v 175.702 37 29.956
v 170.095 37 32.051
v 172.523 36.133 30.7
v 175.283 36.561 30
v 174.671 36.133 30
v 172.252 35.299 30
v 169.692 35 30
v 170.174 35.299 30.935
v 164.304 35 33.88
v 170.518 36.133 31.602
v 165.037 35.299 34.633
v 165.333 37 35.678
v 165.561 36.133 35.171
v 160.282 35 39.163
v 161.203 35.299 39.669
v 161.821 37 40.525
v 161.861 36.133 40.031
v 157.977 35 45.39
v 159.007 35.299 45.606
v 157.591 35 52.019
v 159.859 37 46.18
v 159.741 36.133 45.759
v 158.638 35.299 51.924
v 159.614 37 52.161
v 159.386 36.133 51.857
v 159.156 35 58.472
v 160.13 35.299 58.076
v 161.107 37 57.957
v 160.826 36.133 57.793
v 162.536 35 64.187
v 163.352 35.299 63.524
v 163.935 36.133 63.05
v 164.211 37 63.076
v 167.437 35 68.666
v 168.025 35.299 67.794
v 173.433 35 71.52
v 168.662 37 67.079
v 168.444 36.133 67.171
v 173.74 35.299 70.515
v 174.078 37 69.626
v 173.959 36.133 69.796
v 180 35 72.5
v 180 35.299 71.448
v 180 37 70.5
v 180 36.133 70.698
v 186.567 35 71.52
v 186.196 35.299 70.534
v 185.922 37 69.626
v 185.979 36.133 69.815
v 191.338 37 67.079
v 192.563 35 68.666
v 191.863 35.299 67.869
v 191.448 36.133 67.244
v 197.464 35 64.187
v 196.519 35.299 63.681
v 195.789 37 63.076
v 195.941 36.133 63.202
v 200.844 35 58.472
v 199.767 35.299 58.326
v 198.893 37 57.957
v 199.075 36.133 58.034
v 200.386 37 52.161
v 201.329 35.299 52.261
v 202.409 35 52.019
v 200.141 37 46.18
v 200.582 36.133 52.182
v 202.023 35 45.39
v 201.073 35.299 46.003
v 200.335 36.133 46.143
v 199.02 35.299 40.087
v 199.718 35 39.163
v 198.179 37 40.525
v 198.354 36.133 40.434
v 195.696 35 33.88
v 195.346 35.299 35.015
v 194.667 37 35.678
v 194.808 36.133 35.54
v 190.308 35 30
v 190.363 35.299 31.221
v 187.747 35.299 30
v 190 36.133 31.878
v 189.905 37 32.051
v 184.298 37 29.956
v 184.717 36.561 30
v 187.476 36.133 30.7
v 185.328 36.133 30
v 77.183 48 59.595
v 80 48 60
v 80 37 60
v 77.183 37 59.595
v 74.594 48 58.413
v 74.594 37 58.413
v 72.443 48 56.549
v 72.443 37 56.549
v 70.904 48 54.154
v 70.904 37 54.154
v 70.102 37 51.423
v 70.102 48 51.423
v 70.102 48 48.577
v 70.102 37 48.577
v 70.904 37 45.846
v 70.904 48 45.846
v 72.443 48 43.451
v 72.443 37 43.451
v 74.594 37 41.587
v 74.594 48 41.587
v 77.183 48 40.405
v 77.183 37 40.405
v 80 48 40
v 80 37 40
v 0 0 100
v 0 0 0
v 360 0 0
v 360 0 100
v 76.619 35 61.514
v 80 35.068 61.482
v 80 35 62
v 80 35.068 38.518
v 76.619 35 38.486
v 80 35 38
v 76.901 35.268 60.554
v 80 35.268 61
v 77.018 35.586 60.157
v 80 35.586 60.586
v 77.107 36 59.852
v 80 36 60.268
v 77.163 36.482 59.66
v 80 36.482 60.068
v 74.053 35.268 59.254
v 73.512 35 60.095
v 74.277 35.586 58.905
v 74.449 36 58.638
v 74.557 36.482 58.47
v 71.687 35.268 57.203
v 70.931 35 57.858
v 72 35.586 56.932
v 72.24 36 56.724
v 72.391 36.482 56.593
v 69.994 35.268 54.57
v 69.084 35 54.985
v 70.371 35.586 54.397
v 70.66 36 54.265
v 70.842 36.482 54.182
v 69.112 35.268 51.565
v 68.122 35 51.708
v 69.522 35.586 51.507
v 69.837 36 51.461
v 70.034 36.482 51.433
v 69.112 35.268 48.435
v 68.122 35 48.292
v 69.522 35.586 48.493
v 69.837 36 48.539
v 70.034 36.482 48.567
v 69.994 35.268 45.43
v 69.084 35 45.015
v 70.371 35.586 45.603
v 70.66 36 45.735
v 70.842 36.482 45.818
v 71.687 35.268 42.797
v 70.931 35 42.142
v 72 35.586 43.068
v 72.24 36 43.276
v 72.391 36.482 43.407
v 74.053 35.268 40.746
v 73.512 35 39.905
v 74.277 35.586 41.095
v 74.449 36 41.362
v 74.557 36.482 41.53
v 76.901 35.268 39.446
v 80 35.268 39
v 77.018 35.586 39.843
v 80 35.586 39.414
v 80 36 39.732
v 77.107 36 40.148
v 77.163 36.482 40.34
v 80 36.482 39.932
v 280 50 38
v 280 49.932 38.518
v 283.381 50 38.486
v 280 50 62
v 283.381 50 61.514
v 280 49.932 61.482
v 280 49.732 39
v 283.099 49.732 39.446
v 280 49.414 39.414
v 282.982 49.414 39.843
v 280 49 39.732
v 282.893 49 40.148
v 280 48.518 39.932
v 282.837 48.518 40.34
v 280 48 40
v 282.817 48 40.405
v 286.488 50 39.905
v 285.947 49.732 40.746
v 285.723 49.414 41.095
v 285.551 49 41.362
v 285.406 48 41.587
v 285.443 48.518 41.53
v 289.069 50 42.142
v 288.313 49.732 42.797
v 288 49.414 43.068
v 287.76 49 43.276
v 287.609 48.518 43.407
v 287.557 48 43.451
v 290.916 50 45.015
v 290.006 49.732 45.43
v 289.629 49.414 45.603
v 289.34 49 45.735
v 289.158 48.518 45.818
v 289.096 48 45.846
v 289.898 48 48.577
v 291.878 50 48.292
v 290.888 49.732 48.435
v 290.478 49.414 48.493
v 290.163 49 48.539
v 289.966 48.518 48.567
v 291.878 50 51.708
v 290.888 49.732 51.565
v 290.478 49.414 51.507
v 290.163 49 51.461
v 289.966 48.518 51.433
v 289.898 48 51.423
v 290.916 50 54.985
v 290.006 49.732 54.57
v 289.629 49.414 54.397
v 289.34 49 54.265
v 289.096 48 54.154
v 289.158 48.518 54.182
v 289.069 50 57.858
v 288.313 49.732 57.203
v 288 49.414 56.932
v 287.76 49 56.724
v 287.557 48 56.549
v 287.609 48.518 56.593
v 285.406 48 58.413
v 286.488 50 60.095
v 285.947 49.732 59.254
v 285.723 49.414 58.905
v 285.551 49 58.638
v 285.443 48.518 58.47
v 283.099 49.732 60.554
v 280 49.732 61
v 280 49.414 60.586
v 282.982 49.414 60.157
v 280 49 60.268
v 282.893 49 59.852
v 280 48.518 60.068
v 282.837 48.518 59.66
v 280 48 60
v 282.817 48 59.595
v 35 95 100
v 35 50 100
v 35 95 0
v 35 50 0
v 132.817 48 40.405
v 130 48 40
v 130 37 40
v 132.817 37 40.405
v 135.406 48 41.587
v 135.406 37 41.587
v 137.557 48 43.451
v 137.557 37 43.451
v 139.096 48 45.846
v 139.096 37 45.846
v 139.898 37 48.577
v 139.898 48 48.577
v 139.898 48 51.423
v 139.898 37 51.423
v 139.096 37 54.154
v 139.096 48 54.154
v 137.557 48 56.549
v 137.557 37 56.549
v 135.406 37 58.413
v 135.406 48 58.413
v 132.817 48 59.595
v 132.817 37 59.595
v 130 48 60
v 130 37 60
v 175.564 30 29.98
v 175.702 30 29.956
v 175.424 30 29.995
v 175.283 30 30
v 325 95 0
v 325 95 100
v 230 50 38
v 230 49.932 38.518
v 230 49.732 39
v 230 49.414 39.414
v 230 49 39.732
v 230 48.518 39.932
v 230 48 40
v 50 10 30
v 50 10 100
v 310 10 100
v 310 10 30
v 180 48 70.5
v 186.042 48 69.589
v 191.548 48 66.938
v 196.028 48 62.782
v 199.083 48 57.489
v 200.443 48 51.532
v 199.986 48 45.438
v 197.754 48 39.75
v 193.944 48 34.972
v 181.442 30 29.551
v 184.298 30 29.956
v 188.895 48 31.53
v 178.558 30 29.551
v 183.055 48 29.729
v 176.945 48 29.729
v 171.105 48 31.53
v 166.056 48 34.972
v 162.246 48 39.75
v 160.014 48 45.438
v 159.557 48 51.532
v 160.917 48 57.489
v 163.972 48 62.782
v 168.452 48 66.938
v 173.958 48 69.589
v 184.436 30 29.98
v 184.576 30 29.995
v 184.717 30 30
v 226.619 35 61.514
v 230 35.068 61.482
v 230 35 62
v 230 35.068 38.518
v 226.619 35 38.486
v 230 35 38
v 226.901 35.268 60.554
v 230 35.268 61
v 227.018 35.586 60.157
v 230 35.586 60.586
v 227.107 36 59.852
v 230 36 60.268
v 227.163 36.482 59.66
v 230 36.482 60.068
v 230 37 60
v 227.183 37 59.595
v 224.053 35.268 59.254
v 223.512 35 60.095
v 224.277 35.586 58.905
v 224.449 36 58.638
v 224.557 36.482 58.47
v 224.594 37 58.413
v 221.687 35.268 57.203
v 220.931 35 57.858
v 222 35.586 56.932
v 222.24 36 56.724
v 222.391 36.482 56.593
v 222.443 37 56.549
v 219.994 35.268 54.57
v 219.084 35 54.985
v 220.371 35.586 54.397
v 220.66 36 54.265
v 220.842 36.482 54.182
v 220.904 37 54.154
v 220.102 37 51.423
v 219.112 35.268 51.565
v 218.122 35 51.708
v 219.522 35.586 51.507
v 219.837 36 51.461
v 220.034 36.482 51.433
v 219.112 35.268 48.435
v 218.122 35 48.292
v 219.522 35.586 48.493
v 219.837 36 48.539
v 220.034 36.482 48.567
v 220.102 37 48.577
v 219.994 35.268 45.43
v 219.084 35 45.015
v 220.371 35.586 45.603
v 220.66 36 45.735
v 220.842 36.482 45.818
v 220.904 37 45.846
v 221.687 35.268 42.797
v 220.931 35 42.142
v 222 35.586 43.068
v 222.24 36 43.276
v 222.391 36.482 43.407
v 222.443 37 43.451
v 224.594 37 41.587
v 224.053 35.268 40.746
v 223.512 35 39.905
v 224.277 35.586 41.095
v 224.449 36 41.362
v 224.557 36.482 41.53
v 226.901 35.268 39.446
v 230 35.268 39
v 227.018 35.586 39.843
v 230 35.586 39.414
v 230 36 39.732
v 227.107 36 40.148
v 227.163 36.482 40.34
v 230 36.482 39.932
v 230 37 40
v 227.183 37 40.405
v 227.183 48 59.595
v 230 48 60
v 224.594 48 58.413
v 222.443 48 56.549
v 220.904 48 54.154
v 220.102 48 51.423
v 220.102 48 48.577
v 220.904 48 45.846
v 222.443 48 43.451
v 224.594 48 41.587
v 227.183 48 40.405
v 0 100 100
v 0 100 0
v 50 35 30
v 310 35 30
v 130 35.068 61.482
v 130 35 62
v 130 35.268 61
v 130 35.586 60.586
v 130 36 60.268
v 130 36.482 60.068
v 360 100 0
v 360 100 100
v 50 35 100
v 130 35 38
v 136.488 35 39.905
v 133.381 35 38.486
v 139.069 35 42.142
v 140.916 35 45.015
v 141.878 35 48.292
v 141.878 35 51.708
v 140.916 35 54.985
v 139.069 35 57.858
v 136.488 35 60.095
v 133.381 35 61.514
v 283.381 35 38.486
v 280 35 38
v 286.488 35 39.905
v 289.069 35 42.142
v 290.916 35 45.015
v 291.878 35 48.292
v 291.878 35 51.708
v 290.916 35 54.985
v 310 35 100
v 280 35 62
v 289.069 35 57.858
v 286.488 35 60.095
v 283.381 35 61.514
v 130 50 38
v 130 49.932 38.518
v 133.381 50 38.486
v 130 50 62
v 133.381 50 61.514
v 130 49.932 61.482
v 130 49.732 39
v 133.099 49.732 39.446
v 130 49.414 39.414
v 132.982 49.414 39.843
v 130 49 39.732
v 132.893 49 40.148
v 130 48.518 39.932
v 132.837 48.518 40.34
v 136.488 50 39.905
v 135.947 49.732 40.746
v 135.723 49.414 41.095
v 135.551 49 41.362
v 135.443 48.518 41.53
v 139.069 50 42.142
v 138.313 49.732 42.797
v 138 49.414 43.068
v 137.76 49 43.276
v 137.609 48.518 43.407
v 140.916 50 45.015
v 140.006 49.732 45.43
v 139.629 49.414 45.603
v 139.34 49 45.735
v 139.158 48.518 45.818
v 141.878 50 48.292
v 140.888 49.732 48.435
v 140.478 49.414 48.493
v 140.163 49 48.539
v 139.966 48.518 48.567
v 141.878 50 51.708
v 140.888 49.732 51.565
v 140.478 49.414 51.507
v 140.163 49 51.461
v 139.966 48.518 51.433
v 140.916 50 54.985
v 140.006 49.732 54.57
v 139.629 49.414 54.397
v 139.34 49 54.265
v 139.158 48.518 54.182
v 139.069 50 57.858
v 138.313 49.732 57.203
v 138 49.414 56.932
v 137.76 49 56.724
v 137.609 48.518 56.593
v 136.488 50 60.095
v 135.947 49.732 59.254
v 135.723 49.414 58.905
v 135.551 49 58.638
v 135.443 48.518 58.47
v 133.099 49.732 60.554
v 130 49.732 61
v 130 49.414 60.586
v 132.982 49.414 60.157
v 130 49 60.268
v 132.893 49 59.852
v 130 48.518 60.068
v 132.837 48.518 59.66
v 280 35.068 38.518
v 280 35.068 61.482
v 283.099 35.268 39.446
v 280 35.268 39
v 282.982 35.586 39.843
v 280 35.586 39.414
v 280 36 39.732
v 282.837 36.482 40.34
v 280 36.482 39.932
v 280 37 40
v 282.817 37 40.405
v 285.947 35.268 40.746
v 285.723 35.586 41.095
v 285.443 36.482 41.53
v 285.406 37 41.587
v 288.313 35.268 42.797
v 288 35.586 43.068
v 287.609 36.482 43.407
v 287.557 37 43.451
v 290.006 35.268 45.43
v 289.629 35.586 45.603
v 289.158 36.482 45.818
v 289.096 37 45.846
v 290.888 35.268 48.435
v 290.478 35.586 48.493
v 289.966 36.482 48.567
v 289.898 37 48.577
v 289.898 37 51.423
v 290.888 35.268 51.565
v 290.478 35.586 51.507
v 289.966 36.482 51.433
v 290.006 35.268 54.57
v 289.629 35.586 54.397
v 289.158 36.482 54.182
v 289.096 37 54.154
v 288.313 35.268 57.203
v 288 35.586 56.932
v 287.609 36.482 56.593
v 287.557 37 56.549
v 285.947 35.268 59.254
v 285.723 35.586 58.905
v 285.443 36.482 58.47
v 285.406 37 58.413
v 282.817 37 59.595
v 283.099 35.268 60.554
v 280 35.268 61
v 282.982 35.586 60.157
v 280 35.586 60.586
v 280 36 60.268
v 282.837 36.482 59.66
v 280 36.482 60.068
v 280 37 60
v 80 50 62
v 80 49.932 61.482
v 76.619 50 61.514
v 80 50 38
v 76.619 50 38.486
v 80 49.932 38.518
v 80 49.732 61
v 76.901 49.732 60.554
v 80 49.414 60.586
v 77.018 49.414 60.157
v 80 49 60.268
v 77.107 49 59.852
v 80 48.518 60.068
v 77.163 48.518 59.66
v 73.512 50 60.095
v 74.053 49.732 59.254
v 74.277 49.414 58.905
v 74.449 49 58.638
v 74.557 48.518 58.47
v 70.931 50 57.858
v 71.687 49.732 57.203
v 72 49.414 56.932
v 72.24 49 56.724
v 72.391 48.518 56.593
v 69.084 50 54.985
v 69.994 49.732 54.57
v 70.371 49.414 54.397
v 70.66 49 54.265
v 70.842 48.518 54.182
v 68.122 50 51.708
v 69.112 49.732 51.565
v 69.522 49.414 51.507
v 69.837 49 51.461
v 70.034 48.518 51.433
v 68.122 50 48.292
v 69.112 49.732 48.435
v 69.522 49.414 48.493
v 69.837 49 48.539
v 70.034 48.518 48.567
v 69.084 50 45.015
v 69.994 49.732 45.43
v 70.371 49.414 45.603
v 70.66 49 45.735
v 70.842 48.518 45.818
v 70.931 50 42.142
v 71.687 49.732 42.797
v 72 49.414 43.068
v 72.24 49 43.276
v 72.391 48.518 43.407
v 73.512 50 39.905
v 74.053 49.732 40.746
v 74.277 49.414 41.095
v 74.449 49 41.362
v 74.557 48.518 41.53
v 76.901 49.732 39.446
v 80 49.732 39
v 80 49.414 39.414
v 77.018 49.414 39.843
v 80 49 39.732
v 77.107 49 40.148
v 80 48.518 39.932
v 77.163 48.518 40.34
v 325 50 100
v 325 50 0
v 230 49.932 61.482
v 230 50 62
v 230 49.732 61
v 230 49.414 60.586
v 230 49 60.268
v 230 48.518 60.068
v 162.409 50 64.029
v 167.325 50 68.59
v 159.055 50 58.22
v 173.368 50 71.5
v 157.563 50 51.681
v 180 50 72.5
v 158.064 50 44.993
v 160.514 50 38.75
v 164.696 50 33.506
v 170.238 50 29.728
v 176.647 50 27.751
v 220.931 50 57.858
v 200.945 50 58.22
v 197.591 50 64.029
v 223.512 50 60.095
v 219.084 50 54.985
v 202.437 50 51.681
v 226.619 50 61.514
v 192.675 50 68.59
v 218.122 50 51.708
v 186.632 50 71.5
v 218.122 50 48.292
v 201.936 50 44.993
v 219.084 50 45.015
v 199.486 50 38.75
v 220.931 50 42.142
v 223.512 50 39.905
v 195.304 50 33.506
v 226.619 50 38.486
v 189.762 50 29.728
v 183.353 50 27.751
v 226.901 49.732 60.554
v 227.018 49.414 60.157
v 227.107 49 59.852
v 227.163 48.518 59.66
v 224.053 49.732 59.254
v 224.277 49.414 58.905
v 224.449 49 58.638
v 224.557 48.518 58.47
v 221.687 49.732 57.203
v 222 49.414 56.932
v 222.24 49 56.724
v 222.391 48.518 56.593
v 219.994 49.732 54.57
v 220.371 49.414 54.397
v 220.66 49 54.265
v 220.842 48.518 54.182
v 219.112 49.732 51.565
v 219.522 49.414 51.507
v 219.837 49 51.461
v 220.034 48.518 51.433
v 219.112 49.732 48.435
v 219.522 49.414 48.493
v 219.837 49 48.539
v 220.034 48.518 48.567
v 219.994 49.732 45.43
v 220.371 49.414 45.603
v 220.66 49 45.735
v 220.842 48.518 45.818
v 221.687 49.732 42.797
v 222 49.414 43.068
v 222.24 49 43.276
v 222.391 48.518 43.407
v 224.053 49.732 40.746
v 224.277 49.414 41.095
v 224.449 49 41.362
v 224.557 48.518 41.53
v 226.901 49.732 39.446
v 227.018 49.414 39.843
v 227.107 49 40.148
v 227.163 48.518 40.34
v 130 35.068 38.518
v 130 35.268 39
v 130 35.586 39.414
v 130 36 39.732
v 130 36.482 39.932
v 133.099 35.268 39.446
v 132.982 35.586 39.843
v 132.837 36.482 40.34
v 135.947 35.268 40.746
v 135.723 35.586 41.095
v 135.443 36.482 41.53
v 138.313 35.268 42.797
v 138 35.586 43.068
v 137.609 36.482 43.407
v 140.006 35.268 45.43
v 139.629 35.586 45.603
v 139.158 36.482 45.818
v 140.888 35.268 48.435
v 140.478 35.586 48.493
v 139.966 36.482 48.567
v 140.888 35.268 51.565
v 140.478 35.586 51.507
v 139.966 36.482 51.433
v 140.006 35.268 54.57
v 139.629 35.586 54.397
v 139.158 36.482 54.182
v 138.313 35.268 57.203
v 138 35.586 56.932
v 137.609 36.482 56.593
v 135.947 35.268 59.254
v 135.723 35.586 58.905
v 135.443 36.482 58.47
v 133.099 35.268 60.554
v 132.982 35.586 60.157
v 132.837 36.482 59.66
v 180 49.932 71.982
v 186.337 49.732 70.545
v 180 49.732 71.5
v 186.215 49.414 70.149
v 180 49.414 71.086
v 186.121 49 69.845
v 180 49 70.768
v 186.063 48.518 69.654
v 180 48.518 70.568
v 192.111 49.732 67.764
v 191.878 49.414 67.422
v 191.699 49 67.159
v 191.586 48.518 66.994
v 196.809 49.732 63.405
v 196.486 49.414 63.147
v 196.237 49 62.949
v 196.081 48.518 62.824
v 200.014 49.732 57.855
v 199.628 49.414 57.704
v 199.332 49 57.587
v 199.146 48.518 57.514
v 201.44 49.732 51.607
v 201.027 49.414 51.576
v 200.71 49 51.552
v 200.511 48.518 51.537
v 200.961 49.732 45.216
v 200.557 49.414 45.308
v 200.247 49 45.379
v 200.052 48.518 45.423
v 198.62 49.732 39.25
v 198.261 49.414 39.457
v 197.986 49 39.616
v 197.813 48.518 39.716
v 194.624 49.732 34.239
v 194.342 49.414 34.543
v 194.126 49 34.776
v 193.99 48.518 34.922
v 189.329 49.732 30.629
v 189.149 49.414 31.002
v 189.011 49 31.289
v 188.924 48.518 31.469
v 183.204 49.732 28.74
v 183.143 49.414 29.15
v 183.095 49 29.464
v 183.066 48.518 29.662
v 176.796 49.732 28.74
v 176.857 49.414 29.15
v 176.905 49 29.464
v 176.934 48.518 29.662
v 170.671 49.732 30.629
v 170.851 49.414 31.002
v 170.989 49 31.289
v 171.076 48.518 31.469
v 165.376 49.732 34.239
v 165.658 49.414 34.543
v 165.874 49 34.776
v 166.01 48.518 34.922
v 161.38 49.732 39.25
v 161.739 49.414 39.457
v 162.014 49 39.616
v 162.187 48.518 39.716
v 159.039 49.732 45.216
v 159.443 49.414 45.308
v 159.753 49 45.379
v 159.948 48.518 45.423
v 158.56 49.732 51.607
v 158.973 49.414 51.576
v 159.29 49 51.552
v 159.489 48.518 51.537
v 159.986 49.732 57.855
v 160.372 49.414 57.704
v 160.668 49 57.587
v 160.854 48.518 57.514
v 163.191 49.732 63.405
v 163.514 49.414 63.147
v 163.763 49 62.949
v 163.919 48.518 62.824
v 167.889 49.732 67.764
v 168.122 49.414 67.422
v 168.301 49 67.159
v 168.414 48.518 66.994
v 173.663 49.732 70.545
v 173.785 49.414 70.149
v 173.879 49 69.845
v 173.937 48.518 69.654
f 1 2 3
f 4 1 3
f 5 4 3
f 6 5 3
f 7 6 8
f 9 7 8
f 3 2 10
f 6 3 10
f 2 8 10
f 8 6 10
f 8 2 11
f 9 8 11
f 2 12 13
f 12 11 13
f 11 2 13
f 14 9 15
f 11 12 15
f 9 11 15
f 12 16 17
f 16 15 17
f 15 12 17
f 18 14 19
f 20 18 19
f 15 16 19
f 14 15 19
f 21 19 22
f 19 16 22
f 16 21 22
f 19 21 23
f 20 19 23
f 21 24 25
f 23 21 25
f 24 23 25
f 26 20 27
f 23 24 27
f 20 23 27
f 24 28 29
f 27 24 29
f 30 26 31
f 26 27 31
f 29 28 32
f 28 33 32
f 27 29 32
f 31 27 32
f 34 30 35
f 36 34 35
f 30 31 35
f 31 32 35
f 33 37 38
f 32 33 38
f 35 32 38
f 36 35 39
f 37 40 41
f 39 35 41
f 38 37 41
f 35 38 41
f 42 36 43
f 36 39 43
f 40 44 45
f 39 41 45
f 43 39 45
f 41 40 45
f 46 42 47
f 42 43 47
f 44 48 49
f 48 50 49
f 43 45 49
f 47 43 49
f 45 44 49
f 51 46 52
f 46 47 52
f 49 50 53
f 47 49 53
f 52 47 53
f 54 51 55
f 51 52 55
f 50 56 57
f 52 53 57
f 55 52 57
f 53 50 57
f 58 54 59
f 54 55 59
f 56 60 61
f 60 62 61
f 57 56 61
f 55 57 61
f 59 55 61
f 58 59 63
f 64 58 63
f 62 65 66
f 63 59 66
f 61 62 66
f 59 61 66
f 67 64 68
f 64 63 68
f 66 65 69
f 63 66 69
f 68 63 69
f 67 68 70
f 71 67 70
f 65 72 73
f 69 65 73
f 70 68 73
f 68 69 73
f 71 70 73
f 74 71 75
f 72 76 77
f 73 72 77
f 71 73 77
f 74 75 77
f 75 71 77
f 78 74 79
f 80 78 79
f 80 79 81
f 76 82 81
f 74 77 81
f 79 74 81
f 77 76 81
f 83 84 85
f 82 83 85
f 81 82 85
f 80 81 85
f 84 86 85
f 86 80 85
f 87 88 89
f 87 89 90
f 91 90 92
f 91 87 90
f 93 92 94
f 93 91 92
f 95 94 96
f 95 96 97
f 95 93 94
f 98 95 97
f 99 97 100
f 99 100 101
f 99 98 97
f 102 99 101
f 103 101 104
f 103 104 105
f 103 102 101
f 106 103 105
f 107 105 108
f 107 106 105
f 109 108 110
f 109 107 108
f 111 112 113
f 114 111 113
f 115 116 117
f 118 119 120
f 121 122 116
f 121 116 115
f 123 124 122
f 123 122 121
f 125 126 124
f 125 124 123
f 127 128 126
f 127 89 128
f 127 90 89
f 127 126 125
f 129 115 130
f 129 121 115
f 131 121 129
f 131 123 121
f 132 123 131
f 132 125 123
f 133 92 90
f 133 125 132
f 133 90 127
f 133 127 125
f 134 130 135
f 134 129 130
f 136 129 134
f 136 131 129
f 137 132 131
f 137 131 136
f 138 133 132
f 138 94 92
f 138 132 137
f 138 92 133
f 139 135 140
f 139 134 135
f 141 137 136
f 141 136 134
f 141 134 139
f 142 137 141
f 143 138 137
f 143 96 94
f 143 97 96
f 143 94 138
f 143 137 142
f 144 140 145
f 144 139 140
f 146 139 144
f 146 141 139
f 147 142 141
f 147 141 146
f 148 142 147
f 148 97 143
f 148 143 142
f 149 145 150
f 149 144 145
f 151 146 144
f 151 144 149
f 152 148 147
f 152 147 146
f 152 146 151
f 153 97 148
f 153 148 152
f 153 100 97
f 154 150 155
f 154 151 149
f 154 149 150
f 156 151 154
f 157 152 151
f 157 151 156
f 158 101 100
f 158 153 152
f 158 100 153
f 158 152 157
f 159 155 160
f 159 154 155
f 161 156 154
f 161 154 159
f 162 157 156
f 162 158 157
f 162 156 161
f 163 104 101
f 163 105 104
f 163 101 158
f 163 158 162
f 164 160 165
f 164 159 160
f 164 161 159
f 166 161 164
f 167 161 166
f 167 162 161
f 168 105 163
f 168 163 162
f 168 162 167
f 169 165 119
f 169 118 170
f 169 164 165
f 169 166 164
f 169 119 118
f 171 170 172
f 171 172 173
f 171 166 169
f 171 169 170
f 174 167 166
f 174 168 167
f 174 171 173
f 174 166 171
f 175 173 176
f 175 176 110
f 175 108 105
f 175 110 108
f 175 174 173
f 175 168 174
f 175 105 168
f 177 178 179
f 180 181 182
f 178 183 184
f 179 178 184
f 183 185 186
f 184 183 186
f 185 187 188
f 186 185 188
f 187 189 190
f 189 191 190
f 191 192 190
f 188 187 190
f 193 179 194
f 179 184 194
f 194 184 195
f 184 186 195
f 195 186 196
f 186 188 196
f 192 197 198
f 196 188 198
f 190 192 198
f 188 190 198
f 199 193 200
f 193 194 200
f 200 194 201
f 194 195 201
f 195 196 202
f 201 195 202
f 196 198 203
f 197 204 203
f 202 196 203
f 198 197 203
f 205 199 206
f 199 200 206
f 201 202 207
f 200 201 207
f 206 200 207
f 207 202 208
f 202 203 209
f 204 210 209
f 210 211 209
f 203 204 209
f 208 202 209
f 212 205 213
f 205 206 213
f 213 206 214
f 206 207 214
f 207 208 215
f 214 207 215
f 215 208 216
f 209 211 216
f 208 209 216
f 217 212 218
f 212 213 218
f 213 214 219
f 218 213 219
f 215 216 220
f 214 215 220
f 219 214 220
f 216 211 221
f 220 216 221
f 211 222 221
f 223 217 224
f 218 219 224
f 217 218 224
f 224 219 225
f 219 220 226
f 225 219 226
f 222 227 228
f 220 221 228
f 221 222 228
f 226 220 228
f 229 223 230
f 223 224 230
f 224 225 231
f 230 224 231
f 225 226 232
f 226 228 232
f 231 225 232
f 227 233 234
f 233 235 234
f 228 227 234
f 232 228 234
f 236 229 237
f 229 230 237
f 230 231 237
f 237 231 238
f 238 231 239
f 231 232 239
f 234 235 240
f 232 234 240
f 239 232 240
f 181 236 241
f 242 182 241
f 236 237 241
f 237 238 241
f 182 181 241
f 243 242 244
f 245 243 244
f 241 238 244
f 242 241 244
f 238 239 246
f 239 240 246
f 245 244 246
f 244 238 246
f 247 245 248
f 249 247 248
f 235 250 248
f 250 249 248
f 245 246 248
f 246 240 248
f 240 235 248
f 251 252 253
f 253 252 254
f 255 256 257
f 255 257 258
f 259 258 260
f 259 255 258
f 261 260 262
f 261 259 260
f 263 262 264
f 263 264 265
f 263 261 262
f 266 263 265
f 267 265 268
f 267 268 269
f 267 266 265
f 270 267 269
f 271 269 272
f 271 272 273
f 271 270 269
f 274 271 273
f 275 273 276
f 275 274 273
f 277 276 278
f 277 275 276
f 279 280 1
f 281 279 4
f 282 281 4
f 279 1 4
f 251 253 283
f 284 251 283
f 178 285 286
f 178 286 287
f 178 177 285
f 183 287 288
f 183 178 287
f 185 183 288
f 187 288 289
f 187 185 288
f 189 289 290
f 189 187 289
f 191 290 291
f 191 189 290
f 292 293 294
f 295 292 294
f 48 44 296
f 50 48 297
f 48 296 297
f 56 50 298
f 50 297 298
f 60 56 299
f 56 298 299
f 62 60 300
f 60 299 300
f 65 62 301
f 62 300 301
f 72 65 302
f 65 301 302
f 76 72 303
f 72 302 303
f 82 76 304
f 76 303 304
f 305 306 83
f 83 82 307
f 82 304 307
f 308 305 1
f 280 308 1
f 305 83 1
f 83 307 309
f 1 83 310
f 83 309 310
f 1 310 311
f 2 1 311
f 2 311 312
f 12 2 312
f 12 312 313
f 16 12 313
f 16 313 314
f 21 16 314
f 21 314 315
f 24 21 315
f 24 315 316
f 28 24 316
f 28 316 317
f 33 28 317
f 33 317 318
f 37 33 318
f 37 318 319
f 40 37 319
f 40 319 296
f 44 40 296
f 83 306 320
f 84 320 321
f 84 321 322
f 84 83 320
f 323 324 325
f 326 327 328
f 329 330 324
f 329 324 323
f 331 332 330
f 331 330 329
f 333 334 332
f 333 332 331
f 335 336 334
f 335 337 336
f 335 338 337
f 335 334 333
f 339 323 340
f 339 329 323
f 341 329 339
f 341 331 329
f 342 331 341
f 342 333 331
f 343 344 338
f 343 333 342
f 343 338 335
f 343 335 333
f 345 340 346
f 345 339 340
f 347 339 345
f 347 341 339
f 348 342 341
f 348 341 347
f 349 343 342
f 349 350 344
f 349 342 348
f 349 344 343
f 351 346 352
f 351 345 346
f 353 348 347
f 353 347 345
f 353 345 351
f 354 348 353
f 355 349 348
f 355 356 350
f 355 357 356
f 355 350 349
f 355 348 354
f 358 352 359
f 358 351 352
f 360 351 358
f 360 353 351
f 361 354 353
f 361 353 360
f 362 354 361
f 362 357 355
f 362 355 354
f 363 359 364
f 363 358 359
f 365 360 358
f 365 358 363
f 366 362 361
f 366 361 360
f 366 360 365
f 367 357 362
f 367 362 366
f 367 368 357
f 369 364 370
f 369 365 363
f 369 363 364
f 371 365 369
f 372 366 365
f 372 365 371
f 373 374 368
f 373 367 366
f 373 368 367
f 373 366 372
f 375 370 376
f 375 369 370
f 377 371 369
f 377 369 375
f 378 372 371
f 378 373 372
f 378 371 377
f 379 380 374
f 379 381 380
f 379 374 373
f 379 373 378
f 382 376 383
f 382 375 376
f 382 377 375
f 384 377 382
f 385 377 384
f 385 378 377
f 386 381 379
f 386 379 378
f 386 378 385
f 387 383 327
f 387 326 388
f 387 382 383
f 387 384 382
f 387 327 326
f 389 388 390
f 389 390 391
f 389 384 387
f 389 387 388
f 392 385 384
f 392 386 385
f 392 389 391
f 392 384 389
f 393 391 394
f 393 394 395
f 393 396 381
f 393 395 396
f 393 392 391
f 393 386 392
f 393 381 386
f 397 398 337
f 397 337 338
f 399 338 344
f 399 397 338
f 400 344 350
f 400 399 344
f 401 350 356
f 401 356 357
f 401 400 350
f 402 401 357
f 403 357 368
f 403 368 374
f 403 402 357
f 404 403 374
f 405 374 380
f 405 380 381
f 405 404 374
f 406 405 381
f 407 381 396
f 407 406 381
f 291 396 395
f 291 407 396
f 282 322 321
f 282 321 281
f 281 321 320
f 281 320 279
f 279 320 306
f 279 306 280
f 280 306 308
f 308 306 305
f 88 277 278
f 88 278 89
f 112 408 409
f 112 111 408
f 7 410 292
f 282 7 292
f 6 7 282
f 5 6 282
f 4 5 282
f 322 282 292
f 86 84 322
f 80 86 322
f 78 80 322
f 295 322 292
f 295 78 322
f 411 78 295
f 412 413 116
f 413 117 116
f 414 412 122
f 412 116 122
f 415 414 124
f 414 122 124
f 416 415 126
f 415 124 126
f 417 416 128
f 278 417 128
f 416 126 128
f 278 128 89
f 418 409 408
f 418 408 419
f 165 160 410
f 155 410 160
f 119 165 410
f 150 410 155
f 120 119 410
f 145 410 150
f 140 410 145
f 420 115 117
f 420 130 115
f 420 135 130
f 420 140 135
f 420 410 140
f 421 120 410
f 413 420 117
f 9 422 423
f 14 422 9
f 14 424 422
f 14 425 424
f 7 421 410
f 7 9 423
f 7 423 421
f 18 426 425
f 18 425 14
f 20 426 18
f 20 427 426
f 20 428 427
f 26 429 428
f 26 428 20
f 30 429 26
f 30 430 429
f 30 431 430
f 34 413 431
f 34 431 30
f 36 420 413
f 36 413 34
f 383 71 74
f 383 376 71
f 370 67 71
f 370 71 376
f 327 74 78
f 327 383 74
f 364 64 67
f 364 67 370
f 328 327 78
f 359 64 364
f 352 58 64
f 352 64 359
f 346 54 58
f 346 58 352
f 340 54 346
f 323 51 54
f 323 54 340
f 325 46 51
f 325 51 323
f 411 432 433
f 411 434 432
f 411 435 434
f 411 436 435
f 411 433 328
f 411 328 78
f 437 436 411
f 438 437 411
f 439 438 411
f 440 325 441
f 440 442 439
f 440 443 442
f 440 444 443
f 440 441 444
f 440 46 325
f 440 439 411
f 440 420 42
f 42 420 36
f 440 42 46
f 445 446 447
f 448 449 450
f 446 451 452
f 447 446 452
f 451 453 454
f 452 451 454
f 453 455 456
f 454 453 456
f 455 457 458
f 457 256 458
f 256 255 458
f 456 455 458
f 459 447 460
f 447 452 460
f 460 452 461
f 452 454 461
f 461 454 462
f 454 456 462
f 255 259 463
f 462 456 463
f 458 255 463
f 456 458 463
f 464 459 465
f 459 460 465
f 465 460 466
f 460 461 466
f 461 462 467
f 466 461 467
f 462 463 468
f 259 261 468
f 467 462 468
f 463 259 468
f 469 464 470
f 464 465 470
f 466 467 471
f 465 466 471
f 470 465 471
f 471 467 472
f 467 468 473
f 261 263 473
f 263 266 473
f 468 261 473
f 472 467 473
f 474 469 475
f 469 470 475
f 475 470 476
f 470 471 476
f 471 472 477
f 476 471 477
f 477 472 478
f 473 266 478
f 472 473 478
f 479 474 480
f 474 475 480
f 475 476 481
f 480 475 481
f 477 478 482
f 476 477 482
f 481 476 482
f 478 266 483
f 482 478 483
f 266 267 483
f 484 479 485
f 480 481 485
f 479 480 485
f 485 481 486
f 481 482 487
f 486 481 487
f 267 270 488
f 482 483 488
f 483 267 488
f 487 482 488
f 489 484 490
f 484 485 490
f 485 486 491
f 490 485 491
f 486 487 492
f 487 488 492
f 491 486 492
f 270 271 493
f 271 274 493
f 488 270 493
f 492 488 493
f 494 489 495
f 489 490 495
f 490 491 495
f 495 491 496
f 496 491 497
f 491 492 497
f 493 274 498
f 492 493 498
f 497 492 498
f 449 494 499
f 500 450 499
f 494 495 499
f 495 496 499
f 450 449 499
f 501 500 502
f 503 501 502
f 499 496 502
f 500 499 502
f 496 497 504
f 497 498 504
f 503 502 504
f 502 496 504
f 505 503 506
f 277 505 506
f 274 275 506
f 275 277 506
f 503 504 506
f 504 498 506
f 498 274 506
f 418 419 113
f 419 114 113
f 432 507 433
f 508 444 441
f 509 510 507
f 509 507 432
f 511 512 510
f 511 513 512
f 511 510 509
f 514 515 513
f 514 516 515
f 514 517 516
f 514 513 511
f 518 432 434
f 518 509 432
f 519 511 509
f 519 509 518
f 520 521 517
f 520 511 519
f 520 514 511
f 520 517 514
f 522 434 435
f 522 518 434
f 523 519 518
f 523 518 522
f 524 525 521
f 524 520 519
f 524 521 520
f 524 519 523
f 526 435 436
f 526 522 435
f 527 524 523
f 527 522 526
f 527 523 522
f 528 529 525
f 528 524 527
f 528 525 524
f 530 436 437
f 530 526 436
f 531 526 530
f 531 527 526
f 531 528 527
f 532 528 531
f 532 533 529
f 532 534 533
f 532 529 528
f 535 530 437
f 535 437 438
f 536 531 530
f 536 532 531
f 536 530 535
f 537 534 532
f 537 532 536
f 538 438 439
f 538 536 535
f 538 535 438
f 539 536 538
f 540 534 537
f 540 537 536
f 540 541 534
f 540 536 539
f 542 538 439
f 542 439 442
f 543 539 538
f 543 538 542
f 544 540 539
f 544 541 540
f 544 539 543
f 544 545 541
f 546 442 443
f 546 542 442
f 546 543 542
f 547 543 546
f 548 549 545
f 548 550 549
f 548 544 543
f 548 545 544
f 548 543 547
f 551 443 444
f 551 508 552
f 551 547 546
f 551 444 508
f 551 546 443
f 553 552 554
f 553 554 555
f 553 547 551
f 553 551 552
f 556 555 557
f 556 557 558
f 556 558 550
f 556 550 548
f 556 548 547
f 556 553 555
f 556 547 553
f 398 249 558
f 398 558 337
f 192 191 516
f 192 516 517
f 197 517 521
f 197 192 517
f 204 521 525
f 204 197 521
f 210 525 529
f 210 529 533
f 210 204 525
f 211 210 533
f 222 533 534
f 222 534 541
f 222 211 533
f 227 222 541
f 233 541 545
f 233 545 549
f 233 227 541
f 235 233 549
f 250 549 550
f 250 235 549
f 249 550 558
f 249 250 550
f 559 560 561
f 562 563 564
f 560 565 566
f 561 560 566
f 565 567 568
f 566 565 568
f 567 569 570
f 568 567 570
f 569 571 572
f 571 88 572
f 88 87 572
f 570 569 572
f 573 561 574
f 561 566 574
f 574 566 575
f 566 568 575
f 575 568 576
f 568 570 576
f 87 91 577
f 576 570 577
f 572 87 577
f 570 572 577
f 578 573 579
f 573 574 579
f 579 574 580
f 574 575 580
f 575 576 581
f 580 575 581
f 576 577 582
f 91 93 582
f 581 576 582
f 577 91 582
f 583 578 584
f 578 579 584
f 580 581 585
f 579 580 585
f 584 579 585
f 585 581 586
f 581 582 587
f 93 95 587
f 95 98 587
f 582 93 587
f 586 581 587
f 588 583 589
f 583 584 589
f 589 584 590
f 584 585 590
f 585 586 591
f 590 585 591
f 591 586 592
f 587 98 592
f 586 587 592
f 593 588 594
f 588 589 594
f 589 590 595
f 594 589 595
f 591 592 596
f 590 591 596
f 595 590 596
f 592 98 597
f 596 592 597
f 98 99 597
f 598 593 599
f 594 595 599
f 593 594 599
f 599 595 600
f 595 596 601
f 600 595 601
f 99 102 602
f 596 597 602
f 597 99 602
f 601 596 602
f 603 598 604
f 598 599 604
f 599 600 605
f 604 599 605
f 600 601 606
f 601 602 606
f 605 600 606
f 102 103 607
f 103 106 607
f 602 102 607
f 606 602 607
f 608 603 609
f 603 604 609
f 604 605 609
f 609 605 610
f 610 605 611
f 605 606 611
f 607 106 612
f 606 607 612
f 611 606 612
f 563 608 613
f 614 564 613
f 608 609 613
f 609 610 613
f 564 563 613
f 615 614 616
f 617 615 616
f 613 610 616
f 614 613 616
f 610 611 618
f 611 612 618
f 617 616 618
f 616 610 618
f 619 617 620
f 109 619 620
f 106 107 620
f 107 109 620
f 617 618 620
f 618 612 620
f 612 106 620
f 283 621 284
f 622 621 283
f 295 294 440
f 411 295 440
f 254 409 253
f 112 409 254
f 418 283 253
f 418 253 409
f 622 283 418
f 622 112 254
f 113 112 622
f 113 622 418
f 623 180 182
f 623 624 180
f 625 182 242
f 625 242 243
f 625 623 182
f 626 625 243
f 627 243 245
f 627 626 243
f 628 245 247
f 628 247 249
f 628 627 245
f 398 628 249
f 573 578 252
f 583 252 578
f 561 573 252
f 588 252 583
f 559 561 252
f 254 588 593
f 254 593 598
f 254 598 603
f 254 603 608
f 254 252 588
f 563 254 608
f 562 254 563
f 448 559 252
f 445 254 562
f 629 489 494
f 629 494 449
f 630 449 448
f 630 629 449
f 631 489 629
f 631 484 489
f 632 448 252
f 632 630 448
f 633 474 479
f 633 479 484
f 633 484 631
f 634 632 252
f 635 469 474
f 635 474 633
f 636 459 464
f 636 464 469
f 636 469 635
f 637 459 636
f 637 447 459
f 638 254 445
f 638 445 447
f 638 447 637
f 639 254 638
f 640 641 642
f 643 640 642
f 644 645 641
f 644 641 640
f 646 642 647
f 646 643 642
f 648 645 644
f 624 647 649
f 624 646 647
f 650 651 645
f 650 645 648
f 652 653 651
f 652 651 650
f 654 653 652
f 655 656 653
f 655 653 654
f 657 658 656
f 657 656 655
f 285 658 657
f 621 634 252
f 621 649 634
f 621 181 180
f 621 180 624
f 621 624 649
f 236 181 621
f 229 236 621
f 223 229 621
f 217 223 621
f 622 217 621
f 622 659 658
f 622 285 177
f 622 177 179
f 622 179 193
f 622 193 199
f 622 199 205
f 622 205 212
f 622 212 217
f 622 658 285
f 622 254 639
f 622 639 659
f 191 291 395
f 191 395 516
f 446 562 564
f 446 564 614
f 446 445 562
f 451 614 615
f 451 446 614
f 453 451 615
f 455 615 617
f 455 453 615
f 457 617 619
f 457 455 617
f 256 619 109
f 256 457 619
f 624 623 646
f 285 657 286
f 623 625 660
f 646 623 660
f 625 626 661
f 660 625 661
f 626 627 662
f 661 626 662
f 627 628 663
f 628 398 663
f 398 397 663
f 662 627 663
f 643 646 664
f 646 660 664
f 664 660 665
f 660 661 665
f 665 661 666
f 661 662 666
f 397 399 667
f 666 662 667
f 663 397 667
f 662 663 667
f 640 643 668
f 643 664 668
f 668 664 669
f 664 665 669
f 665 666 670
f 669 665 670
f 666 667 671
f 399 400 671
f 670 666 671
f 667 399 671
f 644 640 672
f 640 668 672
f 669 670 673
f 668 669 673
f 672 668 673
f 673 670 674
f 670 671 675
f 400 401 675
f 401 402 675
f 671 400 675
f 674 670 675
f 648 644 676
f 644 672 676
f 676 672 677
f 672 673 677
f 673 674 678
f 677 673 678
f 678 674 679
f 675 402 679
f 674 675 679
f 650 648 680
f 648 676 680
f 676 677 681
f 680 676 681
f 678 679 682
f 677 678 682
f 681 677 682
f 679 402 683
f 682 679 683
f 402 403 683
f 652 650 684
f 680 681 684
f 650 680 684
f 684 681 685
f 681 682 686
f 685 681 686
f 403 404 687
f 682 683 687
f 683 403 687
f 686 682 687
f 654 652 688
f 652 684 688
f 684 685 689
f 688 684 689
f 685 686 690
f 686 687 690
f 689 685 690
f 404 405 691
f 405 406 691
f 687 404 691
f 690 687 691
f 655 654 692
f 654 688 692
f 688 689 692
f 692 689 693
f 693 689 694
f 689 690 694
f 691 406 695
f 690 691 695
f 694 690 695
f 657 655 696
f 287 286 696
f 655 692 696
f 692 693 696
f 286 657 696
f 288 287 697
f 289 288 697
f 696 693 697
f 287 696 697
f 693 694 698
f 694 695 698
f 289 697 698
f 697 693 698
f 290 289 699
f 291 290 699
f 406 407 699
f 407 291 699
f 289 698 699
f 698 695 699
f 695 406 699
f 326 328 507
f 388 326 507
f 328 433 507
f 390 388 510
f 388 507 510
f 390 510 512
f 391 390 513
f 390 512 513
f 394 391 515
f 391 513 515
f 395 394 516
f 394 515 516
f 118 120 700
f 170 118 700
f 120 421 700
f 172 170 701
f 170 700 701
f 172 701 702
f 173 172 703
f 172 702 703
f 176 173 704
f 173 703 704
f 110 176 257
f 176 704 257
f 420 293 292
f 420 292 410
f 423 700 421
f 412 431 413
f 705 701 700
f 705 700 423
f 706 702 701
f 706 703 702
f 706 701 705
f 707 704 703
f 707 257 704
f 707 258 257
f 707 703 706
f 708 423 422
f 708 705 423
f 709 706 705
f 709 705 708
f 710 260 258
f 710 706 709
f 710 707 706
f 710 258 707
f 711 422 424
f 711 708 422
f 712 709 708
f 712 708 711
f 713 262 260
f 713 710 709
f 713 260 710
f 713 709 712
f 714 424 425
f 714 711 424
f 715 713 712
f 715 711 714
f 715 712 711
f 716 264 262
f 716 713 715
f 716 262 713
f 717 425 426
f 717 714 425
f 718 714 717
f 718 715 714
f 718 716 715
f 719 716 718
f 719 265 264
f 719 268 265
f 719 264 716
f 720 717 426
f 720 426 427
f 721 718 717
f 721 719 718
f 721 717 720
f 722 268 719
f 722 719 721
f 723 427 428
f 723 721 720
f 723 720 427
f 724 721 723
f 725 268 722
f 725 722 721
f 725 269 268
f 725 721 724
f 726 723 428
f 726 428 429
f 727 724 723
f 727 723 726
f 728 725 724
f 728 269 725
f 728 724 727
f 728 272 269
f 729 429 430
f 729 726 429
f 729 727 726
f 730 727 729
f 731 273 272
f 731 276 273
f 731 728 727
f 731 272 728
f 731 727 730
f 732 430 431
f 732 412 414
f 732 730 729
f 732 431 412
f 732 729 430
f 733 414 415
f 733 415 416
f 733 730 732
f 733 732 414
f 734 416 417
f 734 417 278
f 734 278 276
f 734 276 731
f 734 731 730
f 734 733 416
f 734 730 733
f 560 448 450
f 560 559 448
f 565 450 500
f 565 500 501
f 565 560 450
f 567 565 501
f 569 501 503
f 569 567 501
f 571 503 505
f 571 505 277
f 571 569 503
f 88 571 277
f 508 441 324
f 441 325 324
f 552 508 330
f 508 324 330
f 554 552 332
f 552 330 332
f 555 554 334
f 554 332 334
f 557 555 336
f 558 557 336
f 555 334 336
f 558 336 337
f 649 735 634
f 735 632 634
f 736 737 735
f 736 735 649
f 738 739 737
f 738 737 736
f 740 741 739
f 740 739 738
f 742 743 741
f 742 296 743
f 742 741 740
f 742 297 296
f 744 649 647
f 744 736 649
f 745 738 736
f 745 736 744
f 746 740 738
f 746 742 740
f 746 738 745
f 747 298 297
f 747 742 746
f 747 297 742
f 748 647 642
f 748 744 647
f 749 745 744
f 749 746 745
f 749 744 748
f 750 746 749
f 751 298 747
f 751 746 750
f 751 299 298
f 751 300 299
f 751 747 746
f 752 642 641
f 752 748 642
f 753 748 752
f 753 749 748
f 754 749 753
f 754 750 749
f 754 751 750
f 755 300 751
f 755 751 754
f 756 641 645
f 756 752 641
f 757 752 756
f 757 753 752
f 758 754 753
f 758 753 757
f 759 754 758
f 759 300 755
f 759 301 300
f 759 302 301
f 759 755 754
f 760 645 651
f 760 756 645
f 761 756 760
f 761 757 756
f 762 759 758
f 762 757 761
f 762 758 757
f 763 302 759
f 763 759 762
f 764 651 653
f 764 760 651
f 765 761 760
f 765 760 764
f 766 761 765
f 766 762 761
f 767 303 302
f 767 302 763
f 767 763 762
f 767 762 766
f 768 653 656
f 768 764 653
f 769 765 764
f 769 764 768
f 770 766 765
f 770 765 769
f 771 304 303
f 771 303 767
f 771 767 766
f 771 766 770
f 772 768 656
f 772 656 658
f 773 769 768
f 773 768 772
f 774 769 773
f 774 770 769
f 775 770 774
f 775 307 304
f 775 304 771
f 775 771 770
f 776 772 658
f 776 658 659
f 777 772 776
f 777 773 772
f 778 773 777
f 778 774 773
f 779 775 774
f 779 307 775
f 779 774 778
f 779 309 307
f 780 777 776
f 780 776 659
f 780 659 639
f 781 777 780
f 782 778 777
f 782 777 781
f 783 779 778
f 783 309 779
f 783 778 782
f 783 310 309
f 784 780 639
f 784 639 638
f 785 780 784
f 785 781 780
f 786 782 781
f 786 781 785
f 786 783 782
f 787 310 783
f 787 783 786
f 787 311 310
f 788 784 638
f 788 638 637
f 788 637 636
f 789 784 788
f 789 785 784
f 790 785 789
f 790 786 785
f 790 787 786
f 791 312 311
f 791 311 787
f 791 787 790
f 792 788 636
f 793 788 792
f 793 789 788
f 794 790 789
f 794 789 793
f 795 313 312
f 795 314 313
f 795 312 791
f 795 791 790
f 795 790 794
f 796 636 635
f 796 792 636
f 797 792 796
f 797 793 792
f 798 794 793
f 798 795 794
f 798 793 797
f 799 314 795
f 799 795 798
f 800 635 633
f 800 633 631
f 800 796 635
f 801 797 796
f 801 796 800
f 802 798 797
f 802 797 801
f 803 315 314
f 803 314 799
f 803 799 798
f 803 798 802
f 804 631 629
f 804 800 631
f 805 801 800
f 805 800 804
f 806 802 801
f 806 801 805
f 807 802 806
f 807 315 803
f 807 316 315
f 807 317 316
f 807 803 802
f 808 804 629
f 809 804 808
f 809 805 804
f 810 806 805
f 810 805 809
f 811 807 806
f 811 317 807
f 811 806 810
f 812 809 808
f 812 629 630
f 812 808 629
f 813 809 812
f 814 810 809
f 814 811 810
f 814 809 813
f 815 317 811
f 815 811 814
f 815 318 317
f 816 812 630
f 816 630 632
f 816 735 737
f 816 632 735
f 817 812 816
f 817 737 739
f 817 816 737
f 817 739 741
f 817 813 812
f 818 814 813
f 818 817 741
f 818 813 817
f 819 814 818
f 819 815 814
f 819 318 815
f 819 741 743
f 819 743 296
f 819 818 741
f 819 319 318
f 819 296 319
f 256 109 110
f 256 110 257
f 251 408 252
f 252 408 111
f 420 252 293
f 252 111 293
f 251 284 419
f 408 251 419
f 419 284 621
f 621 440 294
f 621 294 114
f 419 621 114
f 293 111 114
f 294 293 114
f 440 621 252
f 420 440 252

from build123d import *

# Parameters (mm, degrees)
SKETCH_1_W          = 360
SKETCH_1_H          = 100
EXTRUDE_1_DEPTH     = 50
CUT_EXTRUDE_1_DEPTH = 40
SKETCH_3_W          = 260
SKETCH_3_H          = 25
CUT_EXTRUDE_2_DEPTH = 70
SKETCH_4_R          = 20.5
CUT_EXTRUDE_3_DEPTH = 20
FILLET_4_R          = 2
SKETCH_6_W          = 35
SKETCH_6_H          = 100
EXTRUDE_2_DEPTH     = 45
SKETCH_7_W          = 360
SKETCH_7_H          = 100
EXTRUDE_3_DEPTH     = 5


with BuildPart() as part:
    # 草图1 → 凸台-拉伸1 (new body)
    with BuildSketch(Plane(origin=(0, 0, 0), x_dir=(1, 0, 0), z_dir=(0, 1, 0))):
        with Locations((180, -50)):
            Rectangle(SKETCH_1_W, SKETCH_1_H)
    extrude(amount=EXTRUDE_1_DEPTH)

    # 草图2 → 切除-拉伸1 (cut)
    with BuildSketch(Plane(origin=(0, 50, 0), x_dir=(1, 0, 0), z_dir=(0, 1, 0))):
        with BuildLine():
            Line((80, -40), (130, -40))
            ThreePointArc((130, -40), (140, -50), (130, -60))
            Line((130, -60), (80, -60))
            ThreePointArc((80, -60), (70, -50), (80, -40))
        make_face()
        with BuildLine():
            Line((230, -40), (280, -40))
            ThreePointArc((280, -40), (290, -50), (280, -60))
            Line((280, -60), (230, -60))
            ThreePointArc((230, -60), (220, -50), (230, -40))
        make_face()
    extrude(amount=-CUT_EXTRUDE_1_DEPTH, mode=Mode.SUBTRACT)

    # 草图3 → 切除-拉伸2 (cut)
    with BuildSketch(Plane.XY.offset(100)):
        with Locations((180, 22.5)):
            Rectangle(SKETCH_3_W, SKETCH_3_H)
    extrude(amount=-CUT_EXTRUDE_2_DEPTH, mode=Mode.SUBTRACT)

    # 草图4 → 切除-拉伸3 (cut)
    with BuildSketch(Plane(origin=(0, 50, 0), x_dir=(1, 0, 0), z_dir=(0, 1, 0))):
        with Locations(Location((180, -50, 0), (0, 0, 270))):
            Circle(SKETCH_4_R)
    extrude(amount=-CUT_EXTRUDE_3_DEPTH, mode=Mode.SUBTRACT)

    # 圆角4
    fillet_4_edges = [part.edges().sort_by_distance(p)[0] for p in [
        (70, 50, 50),
        (105, 50, 60),
        (140, 50, 50),
        (105, 50, 40),
        (220, 50, 50),
        (255, 50, 60),
        (290, 50, 50),
        (255, 50, 40),
        (105, 35, 60),
        (70, 35, 50),
        (105, 35, 40),
        (140, 35, 50),
        (255, 35, 60),
        (220, 35, 50),
        (255, 35, 40),
        (290, 35, 50),
        (184.5, 32.5, 30),
        (175.5, 32.5, 30),
        (159.625383439, 35, 52.263846285),
        (180, 50, 29.5),
    ]]
    fillet(fillet_4_edges, radius=FILLET_4_R)

    # 草图6 → 凸台-拉伸2 (add)
    with BuildSketch(Plane(origin=(0, 50, 0), x_dir=(1, 0, 0), z_dir=(0, 1, 0))):
        with Locations((342.5, -50)):
            Rectangle(SKETCH_6_W, SKETCH_6_H)
        with Locations((17.5, -50)):
            Rectangle(SKETCH_6_W, SKETCH_6_H)
    extrude(amount=EXTRUDE_2_DEPTH)

    # 草图7 → 凸台-拉伸3 (add)
    with BuildSketch(Plane(origin=(0, 95, 0), x_dir=(1, 0, 0), z_dir=(0, 1, 0))):
        with Locations((180, -50)):
            Rectangle(SKETCH_7_W, SKETCH_7_H)
    extrude(amount=EXTRUDE_3_DEPTH)


solid = part.part
